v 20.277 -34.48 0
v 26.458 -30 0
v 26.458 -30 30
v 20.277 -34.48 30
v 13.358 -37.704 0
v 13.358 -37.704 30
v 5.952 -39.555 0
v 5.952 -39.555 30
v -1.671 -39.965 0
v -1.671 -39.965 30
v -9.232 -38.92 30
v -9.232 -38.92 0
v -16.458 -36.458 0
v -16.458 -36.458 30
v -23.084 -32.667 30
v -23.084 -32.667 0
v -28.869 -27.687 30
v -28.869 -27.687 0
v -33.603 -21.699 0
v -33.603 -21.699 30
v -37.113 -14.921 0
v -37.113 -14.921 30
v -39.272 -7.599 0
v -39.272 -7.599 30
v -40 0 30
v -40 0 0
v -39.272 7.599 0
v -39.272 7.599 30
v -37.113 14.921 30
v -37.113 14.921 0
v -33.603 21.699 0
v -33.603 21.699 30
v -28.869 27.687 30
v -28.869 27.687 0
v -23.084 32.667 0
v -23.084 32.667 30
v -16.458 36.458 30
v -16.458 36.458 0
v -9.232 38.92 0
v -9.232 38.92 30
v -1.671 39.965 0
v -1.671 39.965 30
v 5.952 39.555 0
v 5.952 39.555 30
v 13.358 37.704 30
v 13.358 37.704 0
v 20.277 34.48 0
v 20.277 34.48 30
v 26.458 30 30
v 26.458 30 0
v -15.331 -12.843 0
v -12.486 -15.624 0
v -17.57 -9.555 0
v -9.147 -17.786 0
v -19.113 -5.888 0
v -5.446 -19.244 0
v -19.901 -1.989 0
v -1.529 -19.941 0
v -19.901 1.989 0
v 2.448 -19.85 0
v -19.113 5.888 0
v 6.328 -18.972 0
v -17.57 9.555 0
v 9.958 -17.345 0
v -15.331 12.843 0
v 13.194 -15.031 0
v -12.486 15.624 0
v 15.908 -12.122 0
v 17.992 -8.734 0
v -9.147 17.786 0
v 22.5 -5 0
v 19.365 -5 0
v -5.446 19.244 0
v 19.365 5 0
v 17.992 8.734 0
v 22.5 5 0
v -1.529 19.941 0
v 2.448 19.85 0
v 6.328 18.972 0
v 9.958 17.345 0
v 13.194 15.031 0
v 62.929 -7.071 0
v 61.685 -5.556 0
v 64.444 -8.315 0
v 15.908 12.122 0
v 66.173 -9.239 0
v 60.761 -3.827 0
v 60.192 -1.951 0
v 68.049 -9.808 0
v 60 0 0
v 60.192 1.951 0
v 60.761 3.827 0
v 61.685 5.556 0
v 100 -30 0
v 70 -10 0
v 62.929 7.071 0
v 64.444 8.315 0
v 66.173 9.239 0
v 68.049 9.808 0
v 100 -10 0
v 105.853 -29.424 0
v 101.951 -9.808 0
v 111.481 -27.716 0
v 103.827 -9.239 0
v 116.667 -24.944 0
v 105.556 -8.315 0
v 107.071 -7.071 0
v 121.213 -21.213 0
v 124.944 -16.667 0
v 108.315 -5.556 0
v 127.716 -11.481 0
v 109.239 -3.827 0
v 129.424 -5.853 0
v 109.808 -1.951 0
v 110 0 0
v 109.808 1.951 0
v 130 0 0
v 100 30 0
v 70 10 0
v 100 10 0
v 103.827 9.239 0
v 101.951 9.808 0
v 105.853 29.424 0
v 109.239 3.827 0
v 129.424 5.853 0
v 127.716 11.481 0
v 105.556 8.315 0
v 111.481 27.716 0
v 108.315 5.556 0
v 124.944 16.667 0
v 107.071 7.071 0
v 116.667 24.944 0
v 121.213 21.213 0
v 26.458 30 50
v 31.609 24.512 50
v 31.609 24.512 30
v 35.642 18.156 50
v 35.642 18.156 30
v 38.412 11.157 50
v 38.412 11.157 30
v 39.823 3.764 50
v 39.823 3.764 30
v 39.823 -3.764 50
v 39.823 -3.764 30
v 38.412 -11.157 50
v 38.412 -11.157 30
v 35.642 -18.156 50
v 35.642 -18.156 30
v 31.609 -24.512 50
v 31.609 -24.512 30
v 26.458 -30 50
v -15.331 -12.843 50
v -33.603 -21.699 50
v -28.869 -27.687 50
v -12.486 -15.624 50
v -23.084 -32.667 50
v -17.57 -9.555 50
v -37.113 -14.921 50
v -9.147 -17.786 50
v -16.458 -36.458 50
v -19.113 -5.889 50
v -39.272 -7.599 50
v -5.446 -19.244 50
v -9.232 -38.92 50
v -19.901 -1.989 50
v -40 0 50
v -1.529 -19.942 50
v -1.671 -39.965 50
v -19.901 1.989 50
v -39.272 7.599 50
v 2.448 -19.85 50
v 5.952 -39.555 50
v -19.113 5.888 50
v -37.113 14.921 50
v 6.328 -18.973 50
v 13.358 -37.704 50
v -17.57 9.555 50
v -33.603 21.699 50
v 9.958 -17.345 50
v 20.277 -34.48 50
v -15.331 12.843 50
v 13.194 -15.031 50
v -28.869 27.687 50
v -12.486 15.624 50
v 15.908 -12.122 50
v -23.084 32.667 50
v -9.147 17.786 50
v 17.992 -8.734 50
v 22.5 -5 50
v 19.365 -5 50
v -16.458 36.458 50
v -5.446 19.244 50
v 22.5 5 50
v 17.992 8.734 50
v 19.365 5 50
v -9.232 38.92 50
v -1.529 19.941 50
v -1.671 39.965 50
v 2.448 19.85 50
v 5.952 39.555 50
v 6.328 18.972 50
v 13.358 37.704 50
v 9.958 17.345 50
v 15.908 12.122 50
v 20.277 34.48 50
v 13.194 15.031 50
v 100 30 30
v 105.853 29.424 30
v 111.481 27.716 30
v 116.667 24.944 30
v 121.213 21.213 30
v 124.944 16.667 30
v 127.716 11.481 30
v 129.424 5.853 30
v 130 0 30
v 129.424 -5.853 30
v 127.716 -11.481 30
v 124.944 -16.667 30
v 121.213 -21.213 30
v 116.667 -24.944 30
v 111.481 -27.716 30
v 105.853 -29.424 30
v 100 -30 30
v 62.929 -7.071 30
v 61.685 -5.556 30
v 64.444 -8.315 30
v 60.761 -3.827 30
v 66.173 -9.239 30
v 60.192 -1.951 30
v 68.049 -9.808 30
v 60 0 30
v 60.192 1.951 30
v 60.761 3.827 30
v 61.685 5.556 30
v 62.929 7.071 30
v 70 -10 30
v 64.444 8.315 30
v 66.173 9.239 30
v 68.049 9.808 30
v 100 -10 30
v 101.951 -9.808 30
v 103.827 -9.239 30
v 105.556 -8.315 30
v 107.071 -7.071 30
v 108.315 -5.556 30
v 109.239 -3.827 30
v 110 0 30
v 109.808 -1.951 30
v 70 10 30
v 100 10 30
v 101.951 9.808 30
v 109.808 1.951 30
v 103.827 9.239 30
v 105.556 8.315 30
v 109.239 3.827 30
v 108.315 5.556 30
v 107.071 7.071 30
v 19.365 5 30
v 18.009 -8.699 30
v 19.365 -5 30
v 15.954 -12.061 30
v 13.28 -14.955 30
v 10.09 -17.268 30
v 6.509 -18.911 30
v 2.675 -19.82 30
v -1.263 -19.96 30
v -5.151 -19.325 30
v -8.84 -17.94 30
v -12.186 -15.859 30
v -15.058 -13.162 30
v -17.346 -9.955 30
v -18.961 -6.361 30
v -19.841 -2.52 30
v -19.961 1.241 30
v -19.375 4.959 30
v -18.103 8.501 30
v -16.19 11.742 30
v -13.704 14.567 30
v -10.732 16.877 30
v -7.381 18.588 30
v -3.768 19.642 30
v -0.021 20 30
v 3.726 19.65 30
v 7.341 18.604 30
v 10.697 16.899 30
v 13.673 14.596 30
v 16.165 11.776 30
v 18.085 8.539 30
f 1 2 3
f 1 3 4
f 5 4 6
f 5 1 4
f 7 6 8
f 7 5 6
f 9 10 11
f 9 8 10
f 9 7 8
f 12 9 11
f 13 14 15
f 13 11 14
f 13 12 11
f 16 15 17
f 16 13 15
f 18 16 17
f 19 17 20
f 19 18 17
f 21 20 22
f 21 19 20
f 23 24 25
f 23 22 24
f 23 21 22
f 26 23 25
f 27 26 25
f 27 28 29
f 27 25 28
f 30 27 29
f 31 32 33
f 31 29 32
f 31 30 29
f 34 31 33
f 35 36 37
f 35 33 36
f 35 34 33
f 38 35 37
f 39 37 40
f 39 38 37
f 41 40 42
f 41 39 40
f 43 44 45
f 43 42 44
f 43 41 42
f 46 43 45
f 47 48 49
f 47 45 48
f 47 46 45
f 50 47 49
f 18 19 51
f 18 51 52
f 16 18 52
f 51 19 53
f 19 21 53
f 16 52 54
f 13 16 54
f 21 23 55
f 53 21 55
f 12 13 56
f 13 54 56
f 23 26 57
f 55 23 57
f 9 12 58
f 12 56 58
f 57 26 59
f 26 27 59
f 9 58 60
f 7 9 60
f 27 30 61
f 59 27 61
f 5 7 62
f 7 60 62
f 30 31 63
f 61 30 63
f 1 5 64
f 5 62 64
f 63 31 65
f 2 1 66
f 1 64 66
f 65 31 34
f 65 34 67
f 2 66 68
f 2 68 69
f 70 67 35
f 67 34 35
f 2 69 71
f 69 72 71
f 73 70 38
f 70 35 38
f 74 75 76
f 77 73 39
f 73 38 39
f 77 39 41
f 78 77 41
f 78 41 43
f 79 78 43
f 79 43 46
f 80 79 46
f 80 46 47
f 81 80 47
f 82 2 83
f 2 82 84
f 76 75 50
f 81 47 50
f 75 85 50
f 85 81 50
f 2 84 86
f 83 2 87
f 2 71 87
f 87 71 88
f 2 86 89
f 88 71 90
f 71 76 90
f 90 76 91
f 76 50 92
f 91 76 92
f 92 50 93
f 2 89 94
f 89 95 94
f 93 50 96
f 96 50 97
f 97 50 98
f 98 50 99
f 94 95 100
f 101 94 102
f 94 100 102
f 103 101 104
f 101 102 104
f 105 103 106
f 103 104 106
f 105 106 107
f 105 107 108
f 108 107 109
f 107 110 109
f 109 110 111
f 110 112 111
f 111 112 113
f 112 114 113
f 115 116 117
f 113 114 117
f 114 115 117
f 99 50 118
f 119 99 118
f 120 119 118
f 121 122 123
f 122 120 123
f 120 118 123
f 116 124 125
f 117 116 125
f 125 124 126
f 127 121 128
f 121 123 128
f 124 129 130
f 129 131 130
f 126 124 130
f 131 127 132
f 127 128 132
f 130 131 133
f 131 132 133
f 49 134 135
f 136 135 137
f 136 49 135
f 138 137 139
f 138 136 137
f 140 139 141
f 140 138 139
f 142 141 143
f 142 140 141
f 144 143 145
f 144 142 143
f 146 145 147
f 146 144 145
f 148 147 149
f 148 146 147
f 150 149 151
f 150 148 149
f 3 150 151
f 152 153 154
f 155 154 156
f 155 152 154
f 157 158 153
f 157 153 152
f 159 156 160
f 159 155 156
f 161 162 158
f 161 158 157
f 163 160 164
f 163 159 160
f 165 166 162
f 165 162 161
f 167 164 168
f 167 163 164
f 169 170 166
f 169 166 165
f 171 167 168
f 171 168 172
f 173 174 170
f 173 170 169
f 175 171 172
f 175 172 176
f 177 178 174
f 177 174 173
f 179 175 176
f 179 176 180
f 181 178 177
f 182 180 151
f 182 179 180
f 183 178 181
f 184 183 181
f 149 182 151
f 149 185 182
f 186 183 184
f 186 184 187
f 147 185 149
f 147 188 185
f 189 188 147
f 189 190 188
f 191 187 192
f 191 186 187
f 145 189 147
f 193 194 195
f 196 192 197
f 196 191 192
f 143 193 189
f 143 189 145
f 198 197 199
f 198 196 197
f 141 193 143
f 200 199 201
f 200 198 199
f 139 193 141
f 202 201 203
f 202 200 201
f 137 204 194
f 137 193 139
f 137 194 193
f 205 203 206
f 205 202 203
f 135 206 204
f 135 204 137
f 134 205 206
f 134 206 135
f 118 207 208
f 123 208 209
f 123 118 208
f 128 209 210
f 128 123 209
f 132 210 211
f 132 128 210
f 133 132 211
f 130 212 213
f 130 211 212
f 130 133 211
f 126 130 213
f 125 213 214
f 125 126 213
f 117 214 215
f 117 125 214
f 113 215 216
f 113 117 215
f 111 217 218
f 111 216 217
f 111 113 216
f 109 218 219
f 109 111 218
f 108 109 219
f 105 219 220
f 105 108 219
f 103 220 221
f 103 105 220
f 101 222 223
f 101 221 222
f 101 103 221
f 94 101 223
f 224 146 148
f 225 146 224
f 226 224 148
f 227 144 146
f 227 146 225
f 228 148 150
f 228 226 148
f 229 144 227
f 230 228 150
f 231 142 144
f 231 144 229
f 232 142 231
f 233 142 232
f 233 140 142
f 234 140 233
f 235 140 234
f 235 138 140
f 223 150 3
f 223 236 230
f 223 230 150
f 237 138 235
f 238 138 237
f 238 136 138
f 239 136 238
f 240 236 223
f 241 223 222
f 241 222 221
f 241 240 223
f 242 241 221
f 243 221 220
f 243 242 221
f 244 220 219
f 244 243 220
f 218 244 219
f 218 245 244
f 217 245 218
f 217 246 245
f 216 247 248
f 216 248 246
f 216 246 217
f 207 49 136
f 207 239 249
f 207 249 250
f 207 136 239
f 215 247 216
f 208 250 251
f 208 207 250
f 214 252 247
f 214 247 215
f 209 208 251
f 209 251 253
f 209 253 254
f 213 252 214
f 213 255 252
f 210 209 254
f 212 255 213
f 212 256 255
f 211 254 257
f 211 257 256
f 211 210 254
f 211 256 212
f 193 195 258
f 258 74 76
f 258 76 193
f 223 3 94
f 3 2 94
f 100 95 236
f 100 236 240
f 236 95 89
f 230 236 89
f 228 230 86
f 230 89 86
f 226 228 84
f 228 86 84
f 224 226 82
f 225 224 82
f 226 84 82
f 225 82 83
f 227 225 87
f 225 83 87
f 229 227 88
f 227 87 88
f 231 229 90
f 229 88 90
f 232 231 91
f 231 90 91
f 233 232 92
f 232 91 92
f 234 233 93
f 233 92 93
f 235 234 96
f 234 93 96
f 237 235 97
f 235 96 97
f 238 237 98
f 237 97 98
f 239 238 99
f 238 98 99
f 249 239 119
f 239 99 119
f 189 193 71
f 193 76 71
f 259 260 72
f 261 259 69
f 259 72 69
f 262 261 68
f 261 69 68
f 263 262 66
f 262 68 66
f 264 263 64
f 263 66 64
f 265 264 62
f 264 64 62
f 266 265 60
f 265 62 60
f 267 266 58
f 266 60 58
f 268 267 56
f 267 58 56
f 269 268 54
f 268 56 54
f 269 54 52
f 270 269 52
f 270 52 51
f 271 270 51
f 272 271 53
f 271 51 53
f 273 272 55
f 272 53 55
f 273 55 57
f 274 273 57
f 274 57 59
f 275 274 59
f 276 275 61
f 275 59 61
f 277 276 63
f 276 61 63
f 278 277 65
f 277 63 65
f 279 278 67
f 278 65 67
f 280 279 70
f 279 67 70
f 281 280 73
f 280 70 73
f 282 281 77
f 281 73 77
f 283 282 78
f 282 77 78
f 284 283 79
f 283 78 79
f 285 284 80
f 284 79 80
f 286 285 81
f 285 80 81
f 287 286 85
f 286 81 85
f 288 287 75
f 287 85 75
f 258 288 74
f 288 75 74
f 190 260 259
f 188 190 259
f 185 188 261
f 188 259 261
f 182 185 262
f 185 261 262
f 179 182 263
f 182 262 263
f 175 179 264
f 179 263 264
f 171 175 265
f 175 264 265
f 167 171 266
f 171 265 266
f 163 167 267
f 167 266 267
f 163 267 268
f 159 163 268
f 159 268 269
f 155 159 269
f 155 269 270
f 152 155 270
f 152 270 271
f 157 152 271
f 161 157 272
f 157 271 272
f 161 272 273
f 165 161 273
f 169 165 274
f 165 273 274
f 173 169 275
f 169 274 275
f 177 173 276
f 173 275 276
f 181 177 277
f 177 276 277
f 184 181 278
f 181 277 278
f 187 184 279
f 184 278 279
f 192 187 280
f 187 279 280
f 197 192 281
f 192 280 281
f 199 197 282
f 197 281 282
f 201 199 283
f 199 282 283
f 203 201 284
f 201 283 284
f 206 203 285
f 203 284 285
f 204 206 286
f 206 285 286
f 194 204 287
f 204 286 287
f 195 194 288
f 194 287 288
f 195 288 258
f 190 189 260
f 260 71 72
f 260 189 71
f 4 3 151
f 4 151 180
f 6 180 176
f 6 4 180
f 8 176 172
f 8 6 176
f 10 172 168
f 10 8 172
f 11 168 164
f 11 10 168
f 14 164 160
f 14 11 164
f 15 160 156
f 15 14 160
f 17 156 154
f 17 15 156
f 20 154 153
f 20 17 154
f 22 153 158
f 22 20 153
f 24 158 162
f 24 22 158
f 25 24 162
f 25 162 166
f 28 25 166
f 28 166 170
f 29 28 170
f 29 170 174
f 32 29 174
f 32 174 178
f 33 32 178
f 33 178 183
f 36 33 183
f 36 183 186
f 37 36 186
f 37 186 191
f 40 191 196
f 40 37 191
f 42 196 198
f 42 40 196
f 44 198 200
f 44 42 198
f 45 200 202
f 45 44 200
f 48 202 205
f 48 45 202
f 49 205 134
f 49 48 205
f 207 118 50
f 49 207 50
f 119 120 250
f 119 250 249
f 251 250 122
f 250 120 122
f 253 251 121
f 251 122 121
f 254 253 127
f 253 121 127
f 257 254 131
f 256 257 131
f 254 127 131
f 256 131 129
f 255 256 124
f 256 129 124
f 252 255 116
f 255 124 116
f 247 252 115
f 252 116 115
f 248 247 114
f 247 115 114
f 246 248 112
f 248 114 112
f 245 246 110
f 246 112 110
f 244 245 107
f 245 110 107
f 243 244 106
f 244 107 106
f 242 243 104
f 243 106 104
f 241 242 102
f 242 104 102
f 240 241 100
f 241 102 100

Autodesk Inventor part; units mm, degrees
ref_plane "YZ Plane" through (0, 0, 0) normal (1, 0, 0) x (0, 1, 0)
ref_plane "XZ Plane" through (0, 0, 0) normal (0, 1, 0) x (-1, 0, 0)
ref_plane "XY Plane" through (0, 0, 0) normal (0, 0, 1) x (1, 0, 0)
sketch "Boceto1" plane through (0, 0, 0) normal (0, 0, 1) x (1, 0, 0)
  circle A0 centre (0, 0) radius 40
  arc A1 (19.3649, 5) -> (19.3649, -5) centre (0, 0) ccw
  line L0 (19.3649, -5) -> (22.5, -5)
  line L1 (22.5, -5) -> (22.5, 5)
  line L2 (22.5, 5) -> (19.3649, 5)
  line L3 (17.5, 0) -> (22.5, 5) construction
  line L4 (22.5, -5) -> (17.5, 0) construction
  line L5 (0, 0) -> (181.7568, 0) construction
  line L6 (26.4575, -30) -> (100, -30)
  line L7 (130, 0) -> (130, 0)
  line L8 (100, 30) -> (26.4575, 30)
  line L9 (0, -30) -> (130, 30) construction
  line L10 (130, -30) -> (0, 30) construction
  arc A2 (130, 0) -> (100, 30) centre (100, 0) ccw
  arc A3 (100, -30) -> (130, 0) centre (100, 0) ccw
  line L11 (70, -10) -> (100, -10)
  line L12 (110, 0) -> (110, 0)
  line L13 (100, 10) -> (70, 10)
  line L14 (60, 0) -> (60, 0)
  line L15 (60, -10) -> (110, 10) construction
  line L16 (110, -10) -> (60, 10) construction
  arc A4 (110, 0) -> (100, 10) centre (100, 0) ccw
  arc A5 (100, -10) -> (110, 0) centre (100, 0) ccw
  arc A6 (60, 0) -> (70, -10) centre (70, 0) ccw
  arc A7 (70, 10) -> (60, 0) centre (70, 0) ccw
  point P0 (65, 0)
  point P1 (85, 0)
  point P2 (60, 0)
  dimension "d0" = 80
  dimension "d1" = 40
  dimension "d3" = 10
  dimension "d4" = 130
  dimension "d5" = 60
  dimension "d7" = 30
  dimension "d8" = 50
  dimension "d9" = 20
  dimension "d10" = 85
  dimension "d11" = 10
  dimension "d12" = 10
extrude "Extrusión1" add sketch "Boceto1" along normal blind 30
sketch "Boceto2" plane through (0, 0, 30) normal (0, 0, 1) x (1, 0, 0)
  arc A0 (26.4575, 30) -> (26.4575, -30) centre (0, 0) ccw projected
  circle A1 centre (0, 0) radius 40
  arc A2 (19.3649, 5) -> (20, 0) centre (0, 0) ccw
  line L0 (19.3649, 5) -> (22.5, 5)
  line L1 (22.5, 5) -> (22.5, -5)
  line L2 (22.5, -5) -> (19.3649, -5)
  line L3 (18.5, 3) -> (22.5, -5) construction
  line L4 (22.5, 5) -> (20.3695, 0.739) construction
  point P0 (26.4575, -30)
  dimension "d16" = 10
  dimension "d18" = 0
extrude "Extrusión2" add sketch "Boceto2" along normal blind 20
properties part number "Lab2A01209499P19"
